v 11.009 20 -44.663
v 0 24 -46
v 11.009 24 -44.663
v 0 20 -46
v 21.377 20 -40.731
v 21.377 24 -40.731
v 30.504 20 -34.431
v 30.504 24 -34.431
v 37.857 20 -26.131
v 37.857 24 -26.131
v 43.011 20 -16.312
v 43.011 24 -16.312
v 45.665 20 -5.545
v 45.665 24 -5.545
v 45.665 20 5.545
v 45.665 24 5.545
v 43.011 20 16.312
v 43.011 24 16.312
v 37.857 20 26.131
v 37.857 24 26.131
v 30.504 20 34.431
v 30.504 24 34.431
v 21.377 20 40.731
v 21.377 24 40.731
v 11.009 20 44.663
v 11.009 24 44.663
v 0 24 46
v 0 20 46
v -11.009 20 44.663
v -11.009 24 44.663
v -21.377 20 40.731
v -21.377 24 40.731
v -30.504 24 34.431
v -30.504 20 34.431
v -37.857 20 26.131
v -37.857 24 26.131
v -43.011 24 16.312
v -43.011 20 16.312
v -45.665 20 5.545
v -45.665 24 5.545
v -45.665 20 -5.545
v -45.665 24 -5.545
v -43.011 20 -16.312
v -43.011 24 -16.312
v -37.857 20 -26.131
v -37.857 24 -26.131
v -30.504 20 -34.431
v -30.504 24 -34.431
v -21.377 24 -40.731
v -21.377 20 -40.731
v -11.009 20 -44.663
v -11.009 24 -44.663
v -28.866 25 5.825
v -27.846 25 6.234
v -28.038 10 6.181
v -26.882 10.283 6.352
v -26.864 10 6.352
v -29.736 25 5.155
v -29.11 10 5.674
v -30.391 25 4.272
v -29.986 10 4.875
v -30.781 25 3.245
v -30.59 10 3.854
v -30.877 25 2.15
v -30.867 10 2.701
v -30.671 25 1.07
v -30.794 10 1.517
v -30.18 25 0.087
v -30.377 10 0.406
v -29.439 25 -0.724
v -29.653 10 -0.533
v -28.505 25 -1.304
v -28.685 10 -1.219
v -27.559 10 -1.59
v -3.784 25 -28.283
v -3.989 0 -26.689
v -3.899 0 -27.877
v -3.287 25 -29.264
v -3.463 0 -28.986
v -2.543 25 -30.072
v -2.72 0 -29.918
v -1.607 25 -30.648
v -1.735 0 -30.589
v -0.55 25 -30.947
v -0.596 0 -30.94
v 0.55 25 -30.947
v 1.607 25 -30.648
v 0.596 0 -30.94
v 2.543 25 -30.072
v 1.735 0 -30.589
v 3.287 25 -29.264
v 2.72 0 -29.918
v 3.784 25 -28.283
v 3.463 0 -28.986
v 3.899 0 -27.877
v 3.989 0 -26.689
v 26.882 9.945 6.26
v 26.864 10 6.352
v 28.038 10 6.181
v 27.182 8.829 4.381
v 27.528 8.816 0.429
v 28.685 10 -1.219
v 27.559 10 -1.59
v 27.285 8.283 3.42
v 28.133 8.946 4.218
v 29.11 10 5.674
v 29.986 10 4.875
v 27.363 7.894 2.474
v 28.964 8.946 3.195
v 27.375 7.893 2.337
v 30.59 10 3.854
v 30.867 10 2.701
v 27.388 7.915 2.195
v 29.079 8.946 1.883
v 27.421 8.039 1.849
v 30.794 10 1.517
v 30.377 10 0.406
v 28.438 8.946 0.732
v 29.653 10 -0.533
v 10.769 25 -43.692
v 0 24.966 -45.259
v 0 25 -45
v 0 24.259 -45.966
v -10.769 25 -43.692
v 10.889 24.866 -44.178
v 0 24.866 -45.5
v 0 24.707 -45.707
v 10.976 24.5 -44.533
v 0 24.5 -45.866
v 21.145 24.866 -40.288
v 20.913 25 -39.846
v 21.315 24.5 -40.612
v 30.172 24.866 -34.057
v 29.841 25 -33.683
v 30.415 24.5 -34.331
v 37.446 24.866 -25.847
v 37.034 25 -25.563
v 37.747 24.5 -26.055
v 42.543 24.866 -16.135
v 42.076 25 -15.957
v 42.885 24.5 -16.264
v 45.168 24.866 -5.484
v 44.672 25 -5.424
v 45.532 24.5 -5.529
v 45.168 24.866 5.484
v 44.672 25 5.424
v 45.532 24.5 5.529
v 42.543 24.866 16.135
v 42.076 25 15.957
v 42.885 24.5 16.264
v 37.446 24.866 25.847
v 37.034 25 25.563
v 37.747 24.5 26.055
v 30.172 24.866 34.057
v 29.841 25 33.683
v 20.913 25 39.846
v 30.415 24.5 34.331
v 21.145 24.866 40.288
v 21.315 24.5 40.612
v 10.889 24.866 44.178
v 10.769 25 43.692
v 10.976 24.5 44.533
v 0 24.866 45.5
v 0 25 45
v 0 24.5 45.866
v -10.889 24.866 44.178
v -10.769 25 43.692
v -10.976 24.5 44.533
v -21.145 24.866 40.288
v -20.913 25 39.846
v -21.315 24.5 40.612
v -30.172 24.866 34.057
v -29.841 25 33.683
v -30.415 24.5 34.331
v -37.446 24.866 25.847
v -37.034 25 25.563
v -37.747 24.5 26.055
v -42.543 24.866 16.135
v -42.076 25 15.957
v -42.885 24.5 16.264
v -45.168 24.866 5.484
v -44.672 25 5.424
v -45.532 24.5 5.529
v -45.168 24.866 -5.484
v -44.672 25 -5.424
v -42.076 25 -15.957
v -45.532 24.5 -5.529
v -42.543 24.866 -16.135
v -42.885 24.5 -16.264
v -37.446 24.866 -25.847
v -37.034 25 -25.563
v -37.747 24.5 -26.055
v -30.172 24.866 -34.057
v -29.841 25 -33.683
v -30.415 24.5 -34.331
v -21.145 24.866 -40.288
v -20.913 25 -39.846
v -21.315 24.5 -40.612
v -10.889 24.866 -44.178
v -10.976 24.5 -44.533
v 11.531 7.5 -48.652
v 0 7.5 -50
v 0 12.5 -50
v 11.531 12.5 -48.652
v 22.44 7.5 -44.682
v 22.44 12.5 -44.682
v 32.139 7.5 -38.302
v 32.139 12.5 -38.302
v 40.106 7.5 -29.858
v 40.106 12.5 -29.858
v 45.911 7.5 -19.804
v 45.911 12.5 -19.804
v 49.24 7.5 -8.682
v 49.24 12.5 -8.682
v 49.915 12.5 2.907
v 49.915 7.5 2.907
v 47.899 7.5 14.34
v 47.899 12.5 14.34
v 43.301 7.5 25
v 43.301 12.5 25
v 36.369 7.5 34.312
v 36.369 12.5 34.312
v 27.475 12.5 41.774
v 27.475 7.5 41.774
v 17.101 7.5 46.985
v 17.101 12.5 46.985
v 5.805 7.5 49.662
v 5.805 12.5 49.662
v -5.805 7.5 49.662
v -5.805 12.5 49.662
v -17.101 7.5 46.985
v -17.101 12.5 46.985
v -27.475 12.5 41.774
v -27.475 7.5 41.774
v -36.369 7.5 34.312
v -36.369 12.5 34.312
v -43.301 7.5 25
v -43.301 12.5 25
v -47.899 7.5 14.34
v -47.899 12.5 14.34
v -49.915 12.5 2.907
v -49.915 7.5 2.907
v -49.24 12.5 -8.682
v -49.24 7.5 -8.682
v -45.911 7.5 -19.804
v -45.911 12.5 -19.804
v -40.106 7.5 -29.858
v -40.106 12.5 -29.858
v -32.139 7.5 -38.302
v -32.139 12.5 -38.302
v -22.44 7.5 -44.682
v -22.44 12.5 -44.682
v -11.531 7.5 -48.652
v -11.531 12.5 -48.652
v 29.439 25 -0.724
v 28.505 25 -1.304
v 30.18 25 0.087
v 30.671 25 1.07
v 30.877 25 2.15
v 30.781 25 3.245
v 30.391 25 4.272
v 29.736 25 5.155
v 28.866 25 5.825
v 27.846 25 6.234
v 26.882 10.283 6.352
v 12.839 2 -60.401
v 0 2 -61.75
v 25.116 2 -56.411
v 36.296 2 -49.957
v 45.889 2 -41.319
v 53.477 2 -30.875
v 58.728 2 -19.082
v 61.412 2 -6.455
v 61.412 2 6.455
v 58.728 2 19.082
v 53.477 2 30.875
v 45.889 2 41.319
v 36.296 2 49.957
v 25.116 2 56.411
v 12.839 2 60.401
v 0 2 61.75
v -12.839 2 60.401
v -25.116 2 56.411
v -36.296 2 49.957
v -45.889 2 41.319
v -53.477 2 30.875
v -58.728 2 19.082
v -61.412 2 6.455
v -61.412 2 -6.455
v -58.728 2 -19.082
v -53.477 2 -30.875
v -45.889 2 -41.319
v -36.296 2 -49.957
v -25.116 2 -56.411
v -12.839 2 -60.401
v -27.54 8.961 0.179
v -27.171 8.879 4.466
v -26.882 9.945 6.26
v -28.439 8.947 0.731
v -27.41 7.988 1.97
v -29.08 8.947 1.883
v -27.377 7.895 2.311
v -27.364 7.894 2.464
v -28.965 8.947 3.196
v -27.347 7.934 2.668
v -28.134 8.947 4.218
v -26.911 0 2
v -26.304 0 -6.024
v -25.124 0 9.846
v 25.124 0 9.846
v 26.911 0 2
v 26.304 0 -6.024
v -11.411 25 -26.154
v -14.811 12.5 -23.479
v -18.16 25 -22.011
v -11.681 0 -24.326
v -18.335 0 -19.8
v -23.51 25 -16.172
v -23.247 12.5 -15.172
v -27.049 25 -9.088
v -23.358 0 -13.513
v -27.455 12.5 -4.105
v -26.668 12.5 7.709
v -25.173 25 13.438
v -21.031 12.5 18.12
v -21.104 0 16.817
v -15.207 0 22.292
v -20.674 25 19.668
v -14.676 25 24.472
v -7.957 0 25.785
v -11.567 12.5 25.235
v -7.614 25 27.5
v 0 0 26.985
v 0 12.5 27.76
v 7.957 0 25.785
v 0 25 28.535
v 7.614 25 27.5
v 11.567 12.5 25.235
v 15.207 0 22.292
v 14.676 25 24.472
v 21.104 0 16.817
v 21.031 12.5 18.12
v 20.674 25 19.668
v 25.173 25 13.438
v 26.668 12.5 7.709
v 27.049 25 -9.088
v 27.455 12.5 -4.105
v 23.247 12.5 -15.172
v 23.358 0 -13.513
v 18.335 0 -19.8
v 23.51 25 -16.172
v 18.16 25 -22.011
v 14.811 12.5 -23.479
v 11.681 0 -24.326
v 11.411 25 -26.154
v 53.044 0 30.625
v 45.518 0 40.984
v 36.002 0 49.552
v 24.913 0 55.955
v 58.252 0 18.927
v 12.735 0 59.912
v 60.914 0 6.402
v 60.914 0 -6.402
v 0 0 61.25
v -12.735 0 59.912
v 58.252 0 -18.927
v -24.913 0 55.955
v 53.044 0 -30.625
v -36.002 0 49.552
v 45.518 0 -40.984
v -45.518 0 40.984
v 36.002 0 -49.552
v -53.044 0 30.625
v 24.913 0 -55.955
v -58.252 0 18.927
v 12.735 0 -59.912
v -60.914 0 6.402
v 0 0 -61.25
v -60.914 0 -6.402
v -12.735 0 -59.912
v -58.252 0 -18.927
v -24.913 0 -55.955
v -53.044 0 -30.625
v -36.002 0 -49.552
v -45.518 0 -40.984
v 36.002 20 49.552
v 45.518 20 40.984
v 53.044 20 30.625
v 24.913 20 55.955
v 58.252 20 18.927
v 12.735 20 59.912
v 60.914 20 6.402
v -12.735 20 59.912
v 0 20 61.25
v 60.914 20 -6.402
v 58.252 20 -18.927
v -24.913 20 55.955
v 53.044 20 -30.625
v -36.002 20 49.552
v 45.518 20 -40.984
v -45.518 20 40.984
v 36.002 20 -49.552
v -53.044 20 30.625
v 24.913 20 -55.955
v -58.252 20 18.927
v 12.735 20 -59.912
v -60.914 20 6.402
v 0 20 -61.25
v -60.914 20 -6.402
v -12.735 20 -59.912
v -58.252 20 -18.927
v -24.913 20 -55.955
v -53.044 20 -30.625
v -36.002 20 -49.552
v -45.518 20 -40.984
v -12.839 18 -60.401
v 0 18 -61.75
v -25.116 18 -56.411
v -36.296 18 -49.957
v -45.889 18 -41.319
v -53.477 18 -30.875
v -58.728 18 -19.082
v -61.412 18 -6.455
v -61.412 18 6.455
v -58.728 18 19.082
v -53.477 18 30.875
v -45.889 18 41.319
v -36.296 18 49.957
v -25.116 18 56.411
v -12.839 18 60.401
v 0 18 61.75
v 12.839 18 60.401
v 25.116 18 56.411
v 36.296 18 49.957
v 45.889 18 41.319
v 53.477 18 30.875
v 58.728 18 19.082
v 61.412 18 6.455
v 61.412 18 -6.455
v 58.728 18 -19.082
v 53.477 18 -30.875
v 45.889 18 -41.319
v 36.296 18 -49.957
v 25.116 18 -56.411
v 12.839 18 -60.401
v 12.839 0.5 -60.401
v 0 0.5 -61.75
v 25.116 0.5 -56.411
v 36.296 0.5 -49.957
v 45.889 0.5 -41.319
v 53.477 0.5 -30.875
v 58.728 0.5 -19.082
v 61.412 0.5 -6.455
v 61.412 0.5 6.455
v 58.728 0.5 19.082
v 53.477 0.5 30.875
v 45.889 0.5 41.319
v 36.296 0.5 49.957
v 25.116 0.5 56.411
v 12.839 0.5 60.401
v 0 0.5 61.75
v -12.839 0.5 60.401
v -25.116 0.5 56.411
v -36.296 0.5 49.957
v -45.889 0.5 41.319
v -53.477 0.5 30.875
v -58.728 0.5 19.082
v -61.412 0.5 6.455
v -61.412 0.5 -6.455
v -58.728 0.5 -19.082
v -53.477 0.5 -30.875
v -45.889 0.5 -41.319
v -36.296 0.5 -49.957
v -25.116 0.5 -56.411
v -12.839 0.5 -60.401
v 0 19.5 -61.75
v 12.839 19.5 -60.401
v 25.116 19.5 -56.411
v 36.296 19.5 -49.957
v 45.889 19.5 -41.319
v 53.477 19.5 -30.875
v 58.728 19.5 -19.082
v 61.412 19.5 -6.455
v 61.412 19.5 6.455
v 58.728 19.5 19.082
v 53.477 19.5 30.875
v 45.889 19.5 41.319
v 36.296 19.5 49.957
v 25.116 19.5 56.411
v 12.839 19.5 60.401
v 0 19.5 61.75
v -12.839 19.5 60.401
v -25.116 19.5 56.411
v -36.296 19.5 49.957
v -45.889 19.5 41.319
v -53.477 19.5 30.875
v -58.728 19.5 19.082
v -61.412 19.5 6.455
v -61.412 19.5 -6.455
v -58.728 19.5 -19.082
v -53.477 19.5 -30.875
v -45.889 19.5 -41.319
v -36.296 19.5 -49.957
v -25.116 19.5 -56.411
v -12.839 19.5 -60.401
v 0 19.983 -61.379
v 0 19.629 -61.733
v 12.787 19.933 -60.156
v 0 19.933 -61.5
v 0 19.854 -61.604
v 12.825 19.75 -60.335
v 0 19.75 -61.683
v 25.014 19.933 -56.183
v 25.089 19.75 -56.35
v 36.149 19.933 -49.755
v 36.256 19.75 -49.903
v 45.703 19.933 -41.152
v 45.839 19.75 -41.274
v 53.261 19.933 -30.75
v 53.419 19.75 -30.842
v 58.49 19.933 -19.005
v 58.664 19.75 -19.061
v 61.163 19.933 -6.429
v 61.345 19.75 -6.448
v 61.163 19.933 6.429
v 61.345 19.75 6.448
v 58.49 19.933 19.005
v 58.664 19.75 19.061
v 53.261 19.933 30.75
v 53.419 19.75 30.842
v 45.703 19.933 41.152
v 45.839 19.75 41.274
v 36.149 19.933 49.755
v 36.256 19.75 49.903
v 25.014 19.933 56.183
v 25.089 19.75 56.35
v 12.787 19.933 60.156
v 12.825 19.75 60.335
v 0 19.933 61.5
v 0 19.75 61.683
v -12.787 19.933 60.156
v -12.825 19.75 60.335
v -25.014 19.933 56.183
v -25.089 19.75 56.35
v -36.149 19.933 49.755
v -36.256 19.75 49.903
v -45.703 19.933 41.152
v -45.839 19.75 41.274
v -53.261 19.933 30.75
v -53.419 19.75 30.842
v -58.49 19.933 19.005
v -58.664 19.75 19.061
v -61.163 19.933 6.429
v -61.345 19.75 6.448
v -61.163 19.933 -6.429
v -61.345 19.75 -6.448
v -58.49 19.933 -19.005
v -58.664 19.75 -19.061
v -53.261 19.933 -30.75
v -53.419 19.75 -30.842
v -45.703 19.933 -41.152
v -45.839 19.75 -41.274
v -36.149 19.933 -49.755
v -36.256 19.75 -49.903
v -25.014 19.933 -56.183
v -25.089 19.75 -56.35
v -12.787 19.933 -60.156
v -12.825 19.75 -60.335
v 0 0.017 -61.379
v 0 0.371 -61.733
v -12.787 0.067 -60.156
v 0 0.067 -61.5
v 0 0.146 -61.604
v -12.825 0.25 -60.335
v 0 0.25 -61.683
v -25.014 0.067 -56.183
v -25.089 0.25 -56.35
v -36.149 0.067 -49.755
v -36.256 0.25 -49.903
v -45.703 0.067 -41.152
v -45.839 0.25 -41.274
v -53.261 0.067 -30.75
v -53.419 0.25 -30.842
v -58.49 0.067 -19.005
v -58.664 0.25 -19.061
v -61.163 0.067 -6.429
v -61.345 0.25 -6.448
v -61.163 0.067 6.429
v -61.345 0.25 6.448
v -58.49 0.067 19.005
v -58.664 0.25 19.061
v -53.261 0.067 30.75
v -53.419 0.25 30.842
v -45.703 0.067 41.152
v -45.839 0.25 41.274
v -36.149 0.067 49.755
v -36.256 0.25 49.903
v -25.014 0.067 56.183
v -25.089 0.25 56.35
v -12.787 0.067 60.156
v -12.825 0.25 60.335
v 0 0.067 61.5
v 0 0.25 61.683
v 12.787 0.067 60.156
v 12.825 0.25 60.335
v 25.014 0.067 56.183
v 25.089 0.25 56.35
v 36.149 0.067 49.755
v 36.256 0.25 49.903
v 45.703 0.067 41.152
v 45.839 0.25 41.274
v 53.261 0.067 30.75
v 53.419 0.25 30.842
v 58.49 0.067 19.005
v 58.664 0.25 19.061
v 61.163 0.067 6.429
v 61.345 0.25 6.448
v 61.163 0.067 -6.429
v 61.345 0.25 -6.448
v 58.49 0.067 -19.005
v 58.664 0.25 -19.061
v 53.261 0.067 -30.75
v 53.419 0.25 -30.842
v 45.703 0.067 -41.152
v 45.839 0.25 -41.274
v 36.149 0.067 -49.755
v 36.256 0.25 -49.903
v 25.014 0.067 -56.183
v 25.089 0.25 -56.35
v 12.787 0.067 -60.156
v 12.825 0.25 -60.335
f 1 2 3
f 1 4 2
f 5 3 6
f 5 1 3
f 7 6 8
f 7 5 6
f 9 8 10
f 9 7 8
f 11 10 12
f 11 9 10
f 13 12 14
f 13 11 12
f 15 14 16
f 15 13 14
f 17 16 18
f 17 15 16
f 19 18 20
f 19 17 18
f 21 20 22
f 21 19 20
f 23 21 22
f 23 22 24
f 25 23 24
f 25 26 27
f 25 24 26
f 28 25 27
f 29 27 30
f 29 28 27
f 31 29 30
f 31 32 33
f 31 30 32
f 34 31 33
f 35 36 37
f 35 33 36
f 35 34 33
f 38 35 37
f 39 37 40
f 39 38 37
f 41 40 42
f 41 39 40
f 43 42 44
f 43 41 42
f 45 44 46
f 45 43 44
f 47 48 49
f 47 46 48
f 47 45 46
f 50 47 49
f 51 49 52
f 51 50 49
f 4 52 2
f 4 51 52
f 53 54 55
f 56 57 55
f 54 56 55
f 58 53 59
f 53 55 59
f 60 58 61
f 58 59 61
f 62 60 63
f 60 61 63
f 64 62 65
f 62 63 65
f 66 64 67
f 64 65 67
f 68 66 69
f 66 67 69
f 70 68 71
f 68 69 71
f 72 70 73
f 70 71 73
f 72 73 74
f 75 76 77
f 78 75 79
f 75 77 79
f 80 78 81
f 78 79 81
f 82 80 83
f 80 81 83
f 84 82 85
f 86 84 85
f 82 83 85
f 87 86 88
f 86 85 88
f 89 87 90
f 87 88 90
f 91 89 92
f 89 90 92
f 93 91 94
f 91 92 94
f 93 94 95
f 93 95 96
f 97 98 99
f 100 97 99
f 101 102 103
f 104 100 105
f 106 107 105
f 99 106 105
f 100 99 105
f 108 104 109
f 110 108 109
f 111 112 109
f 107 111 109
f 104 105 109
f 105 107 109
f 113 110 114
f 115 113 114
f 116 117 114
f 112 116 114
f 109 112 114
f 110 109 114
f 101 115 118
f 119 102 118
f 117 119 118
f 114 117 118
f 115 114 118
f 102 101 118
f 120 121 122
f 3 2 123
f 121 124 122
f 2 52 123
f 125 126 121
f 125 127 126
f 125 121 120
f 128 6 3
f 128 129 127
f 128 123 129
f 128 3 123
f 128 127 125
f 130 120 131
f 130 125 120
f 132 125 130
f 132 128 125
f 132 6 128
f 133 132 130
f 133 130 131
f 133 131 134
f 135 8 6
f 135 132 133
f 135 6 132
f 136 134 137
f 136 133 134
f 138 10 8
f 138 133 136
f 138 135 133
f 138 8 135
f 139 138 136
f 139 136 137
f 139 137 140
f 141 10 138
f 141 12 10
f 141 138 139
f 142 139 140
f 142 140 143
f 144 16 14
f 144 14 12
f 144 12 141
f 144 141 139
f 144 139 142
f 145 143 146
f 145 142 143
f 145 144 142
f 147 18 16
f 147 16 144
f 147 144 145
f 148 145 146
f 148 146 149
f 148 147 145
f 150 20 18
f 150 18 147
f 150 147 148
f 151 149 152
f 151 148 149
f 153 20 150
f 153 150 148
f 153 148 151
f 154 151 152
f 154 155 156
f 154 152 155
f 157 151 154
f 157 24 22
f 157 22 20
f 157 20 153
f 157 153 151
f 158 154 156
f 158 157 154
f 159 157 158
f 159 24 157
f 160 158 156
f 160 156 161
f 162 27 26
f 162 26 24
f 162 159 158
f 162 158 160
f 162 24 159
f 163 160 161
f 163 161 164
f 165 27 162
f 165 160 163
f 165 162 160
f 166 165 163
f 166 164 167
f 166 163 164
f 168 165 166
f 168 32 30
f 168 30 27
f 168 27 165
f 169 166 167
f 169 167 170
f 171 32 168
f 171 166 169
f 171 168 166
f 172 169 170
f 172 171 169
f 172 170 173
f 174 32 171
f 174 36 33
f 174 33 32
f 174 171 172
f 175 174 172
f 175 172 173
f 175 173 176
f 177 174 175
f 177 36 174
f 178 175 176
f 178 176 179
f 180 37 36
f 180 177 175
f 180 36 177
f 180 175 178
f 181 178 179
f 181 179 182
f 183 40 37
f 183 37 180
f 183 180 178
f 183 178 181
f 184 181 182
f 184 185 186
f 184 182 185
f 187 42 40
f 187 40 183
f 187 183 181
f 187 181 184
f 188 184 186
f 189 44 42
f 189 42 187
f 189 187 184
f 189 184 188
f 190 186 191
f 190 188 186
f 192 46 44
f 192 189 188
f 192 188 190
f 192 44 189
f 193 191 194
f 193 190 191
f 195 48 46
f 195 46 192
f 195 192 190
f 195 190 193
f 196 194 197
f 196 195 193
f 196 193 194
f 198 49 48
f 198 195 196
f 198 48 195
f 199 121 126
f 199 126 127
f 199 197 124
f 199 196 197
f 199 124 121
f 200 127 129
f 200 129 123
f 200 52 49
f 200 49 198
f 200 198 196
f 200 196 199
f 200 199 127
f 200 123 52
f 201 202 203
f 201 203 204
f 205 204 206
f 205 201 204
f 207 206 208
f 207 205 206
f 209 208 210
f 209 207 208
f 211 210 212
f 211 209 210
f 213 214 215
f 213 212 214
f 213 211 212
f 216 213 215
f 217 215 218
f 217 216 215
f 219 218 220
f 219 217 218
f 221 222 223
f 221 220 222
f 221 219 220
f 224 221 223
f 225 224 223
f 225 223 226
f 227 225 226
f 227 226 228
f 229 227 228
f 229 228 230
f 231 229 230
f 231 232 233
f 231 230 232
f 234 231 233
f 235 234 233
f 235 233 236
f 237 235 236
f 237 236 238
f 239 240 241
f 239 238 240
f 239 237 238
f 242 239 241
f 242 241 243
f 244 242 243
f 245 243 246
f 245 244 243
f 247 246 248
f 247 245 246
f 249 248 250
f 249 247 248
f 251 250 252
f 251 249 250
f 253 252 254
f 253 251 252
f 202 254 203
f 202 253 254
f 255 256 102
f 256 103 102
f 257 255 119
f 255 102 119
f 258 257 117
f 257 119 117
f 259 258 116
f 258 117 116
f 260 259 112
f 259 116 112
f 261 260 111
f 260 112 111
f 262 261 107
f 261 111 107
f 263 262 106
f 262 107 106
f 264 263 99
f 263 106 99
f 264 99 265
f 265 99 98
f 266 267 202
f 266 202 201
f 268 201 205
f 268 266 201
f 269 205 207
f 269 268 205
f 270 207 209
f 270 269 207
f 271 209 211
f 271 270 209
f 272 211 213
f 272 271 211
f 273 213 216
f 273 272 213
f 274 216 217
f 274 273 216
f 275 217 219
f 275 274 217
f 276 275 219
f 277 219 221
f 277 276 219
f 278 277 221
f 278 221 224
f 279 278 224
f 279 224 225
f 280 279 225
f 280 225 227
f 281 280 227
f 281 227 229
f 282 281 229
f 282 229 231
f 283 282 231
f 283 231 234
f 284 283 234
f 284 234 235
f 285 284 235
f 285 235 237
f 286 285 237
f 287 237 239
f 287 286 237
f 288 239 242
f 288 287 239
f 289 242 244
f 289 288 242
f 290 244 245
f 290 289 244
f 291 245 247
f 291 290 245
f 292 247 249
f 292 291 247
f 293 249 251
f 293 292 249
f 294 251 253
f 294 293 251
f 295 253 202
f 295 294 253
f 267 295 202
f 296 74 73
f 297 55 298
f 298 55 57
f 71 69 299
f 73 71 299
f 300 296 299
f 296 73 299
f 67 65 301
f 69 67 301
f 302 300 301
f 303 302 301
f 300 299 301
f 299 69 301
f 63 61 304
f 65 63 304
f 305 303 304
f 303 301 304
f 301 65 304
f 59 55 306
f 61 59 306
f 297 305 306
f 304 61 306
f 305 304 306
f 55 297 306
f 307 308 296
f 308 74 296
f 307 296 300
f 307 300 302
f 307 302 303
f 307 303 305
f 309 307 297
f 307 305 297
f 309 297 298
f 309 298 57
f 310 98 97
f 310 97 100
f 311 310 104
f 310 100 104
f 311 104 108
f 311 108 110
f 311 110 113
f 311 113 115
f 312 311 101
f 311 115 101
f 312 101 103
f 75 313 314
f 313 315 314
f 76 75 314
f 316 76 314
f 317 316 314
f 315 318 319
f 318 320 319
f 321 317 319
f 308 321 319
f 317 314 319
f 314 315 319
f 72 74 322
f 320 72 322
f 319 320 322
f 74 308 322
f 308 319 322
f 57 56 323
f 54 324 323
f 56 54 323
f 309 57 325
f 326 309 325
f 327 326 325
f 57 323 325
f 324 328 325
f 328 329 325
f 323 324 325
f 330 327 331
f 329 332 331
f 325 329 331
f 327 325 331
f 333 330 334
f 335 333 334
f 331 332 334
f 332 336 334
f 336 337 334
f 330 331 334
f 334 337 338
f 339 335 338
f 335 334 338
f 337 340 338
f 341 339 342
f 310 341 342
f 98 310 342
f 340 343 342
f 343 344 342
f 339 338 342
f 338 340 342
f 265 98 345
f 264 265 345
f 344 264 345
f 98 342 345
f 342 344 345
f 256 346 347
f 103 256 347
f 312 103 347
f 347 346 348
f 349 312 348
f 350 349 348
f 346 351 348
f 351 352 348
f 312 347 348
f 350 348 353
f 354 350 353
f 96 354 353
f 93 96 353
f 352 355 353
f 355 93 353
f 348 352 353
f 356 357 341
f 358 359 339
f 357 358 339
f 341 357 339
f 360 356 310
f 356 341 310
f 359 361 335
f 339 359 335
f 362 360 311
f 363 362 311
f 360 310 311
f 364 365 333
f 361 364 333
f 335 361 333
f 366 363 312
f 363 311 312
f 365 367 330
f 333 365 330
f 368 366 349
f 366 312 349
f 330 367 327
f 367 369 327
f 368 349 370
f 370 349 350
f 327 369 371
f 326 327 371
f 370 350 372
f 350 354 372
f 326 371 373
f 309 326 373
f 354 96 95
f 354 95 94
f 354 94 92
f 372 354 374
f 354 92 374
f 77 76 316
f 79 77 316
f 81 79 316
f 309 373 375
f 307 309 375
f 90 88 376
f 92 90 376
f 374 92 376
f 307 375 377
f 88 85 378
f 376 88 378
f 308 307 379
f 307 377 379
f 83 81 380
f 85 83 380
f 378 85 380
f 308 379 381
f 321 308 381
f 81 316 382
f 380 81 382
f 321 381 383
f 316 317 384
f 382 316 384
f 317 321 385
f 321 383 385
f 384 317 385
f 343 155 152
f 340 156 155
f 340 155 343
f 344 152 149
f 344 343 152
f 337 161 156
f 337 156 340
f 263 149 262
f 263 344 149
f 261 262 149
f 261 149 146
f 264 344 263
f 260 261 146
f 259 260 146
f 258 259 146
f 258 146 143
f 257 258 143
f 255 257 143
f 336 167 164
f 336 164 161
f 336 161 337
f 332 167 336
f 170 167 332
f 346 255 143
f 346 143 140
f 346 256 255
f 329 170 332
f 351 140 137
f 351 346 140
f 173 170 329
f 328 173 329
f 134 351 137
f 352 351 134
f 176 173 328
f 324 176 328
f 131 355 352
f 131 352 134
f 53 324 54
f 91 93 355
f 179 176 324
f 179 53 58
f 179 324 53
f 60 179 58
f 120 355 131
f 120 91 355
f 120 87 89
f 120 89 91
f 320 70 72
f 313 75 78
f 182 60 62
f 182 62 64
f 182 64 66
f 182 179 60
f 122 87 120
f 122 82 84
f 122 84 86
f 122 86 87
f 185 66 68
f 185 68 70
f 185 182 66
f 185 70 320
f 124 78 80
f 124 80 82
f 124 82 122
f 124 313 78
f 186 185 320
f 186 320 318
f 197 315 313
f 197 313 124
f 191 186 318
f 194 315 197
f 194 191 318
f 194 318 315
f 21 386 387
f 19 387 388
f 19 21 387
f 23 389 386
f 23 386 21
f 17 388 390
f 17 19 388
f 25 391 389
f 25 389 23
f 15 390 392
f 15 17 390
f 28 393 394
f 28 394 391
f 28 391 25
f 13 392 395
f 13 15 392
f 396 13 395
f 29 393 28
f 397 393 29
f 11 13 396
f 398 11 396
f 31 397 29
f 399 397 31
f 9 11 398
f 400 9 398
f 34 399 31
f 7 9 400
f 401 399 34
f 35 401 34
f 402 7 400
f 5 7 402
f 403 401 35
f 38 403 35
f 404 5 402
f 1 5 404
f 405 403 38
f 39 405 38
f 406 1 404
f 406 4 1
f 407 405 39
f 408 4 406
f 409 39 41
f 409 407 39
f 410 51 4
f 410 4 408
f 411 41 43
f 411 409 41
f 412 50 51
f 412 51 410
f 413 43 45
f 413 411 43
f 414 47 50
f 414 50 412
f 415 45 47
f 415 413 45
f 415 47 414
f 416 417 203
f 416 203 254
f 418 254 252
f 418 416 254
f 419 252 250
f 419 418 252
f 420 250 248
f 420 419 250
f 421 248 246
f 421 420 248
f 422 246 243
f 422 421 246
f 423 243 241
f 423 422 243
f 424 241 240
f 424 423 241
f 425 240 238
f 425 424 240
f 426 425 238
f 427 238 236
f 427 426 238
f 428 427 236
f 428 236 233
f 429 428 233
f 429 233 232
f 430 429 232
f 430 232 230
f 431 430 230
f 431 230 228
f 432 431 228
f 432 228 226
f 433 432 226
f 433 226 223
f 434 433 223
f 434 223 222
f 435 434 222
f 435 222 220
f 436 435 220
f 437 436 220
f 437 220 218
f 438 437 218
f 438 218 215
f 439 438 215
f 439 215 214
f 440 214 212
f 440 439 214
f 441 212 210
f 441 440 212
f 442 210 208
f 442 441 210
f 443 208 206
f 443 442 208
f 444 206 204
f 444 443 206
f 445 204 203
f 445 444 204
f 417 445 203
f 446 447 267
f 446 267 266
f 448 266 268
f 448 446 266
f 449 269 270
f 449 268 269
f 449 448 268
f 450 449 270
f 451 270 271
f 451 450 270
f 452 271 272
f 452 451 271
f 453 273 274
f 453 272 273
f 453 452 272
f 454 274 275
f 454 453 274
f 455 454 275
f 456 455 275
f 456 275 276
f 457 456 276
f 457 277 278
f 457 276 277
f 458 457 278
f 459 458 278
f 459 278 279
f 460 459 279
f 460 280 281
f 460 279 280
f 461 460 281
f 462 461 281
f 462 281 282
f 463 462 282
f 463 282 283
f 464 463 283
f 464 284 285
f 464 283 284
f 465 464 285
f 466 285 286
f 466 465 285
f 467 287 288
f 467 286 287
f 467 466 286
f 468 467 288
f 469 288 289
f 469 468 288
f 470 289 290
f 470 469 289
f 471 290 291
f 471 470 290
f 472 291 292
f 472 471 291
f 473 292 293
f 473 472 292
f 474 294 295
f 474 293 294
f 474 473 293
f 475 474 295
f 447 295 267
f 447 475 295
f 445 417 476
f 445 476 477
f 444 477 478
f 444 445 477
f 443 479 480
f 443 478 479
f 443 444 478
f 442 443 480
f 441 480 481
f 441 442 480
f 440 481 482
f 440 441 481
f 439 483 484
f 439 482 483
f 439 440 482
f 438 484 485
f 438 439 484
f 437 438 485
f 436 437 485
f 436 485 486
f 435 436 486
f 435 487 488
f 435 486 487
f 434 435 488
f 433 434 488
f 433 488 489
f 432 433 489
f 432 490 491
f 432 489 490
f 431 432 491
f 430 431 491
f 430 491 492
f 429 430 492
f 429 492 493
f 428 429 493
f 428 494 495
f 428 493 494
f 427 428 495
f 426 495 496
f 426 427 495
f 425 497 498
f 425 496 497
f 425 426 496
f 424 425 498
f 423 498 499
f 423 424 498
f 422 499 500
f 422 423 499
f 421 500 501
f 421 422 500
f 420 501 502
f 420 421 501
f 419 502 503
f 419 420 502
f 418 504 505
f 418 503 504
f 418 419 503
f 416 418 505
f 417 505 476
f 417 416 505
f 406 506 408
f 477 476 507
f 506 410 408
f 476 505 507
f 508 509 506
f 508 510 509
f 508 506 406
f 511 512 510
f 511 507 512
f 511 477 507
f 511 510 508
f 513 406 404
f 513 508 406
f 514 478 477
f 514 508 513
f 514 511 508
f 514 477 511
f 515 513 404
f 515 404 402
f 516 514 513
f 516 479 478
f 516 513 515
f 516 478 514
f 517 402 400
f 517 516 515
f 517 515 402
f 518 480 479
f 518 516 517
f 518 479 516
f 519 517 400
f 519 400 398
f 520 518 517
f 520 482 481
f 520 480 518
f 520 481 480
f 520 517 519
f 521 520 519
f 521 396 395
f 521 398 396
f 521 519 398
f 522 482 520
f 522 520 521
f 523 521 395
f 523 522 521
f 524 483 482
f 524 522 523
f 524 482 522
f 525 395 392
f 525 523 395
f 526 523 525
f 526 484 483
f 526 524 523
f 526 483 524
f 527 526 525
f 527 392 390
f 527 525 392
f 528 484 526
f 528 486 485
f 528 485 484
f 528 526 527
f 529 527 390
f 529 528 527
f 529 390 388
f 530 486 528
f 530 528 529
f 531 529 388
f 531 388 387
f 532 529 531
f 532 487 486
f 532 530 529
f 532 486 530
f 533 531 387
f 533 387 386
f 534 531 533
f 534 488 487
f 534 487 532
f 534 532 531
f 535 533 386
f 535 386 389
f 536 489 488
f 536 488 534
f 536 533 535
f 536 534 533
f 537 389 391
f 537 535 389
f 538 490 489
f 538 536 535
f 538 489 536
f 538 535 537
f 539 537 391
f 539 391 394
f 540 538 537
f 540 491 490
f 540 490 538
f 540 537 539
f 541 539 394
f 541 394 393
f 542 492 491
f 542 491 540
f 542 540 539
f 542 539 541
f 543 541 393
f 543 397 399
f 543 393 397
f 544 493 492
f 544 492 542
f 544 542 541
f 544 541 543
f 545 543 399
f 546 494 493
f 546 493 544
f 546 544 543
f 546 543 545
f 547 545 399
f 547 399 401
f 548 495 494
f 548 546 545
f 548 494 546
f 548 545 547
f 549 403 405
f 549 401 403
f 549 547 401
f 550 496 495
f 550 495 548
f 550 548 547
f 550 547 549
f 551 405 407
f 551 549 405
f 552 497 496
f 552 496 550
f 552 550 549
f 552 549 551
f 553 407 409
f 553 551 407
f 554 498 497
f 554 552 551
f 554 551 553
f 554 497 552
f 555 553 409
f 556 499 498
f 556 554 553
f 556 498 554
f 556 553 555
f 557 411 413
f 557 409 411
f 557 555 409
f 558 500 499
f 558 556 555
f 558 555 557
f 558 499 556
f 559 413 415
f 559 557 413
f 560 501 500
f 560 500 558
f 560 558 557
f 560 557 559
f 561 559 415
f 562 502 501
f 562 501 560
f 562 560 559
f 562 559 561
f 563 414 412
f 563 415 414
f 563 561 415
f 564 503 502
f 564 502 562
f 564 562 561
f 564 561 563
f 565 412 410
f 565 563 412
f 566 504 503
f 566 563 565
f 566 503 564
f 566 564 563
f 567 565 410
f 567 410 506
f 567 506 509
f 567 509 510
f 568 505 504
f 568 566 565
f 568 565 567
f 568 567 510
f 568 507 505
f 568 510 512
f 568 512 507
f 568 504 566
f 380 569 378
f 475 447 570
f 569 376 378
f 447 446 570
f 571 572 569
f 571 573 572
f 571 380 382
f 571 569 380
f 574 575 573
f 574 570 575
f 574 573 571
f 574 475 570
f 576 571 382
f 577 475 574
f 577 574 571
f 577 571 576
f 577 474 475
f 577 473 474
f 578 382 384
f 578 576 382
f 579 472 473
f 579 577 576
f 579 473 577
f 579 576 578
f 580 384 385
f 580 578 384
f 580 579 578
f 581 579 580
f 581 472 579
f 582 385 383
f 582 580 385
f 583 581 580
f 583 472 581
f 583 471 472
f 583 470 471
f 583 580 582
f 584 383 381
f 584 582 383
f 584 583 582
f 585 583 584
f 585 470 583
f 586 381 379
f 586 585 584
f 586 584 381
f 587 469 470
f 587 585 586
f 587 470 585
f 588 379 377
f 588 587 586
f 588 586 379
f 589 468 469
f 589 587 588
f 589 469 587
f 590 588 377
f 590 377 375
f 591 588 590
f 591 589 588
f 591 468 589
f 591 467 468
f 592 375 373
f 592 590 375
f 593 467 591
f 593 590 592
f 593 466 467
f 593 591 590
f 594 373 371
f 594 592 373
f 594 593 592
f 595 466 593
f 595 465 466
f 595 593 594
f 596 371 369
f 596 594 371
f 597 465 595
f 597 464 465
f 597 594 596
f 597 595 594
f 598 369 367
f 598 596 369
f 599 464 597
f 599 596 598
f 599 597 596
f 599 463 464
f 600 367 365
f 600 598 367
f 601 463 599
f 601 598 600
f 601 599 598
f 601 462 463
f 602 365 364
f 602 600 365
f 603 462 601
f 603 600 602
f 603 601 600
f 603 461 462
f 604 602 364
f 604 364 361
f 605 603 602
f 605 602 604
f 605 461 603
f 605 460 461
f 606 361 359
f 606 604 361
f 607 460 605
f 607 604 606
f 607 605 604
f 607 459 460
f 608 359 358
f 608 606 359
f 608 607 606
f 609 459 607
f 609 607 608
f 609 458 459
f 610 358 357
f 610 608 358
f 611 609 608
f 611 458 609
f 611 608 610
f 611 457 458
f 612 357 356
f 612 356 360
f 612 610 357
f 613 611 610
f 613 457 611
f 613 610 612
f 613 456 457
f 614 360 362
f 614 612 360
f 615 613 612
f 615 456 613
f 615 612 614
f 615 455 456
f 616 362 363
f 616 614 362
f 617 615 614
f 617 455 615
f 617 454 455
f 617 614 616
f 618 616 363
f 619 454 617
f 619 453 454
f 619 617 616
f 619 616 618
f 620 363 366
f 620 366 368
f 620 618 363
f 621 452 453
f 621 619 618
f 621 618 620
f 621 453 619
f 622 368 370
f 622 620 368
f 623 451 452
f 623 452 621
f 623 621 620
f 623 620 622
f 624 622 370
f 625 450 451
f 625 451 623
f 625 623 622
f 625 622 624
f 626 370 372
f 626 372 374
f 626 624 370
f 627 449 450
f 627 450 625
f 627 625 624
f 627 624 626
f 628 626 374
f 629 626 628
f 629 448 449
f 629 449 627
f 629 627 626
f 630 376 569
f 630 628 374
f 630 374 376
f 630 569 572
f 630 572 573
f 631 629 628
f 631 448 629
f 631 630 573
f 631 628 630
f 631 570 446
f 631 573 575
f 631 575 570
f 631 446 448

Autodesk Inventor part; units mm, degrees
ref_plane "YZ Plane" through (0, 0, 0) normal (1, 0, 0) x (0, 1, 0)
ref_plane "XZ Plane" through (0, 0, 0) normal (0, 1, 0) x (-1, 0, 0)
ref_plane "XY Plane" through (0, 0, 0) normal (0, 0, 1) x (1, 0, 0)
sketch "Sketch1" plane through (0, 0, 0) normal (1, 0, 0) x (0, 1, 0)
  line L0 (25, -28.535) -> (25, -46)
  line L1 (25, -46) -> (20, -46)
  line L2 (20, -46) -> (20, -61.75)
  line L3 (20, -61.75) -> (18, -61.75)
  line L4 (18, -61.75) -> (12.5, -50)
  line L5 (12.5, -50) -> (7.5, -50)
  line L6 (2, -61.75) -> (0, -61.75)
  line L7 (7.5, -50) -> (2, -61.75)
  line L8 (-5, 0) -> (30, 0) projected
  line L9 (0, -61.75) -> (0, -26.985)
  line L10 (25, -28.535) -> (0, -26.985)
  point P0 (0, 0)
  point P1 (10, -50)
  dimension "d4" = 5
  dimension "d5" = 2
  dimension "d24" = 28.535
  dimension "d26" = 5
  dimension "d27" = 17.465
  dimension "d29" = 26.985
  dimension "d30" = 61.75
  dimension "d31" = 25
  dimension "d32" = 50
revolve "Revolution1" add sketch "Sketch1" angle 360 about axis through (0, -10, 0) along (0, 1, 0)
fillet "Fillet1" radius 1 1 edges at (0, 25, 46)
fillet "Fillet2" radius 0.5 2 edges at (0, 20, 61.75) (0, 0, 61.75)
sketch "Sketch5" plane through (0, 25, 0) normal (0, 1, 0) x (1, 0, 0)
  circle A0 centre (0, 0) radius 26.985 projected
  line L0 (0, 0) -> (0, 26.985) construction
hole "Hole1" at (0, 25, -26.985) direction (0, -1, 0) diameter 8 end through all
sketch "Sketch6" plane through (0, 25, 0) normal (0, 1, 0) x (1, 0, 0)
  line L0 (0, 0) -> (26.8823, -2.3519) construction
  arc A0 (-3.989, 26.6885) -> (3.989, 26.6885) centre (0, 0) ccw projected
  line L1 (0, 0) -> (0, -26.985) construction
  line L2 (0, 0) -> (-26.8823, -2.3519) construction
  dimension "d40" = 85
  dimension "d41" = 85
hole "Hole2" at (26.8823, 25, 2.3519) at (-26.8823, 25, 2.3519) direction (0, -1, 0) diameter 8 depth 15 tip angle 118
equation "\"d41\" = d40"
properties part number "Шкив 118 мм"
